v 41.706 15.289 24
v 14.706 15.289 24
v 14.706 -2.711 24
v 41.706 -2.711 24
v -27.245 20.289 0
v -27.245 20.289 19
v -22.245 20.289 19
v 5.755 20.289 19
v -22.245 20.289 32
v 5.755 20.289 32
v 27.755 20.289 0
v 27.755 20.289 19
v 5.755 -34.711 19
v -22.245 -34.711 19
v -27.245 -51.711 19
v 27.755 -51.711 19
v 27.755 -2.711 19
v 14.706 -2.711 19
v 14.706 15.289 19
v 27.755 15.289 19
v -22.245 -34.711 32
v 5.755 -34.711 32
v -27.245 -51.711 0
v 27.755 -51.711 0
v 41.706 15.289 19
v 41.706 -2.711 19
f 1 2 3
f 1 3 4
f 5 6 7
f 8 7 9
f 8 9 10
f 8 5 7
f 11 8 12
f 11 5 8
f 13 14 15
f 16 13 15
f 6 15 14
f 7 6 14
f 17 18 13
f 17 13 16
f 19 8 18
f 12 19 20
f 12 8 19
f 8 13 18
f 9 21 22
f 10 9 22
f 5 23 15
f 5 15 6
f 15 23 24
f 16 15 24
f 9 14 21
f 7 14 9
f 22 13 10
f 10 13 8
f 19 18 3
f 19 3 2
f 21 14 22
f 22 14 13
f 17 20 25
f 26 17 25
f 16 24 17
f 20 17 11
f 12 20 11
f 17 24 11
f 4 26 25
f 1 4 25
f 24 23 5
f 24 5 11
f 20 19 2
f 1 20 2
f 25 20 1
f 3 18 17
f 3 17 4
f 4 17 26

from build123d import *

# Parameters (mm, degrees)
SKIZZE1_W                       = 55
SKIZZE1_H                       = 72
AUFSATZ_LINEAR_AUSTRAGEN1_DEPTH = 19
SKIZZE2_W                       = 28
SKIZZE2_H                       = 55
AUFSATZ_LINEAR_AUSTRAGEN2_DEPTH = 13
SKIZZE3_W                       = 27
SKIZZE3_H                       = 18
AUFSATZ_LINEAR_AUSTRAGEN3_DEPTH = 5


with BuildPart() as part:
    # Skizze1 → Aufsatz-Linear austragen1 (new body)
    with BuildSketch(Plane.XY):
        with Locations((0.254783725, -15.710963455)):
            Rectangle(SKIZZE1_W, SKIZZE1_H)
    extrude(amount=AUFSATZ_LINEAR_AUSTRAGEN1_DEPTH)

    # Skizze2 → Aufsatz-Linear austragen2 (add)
    with BuildSketch(Plane.XY.offset(19)):
        with Locations((-8.245216275, -7.210963455)):
            Rectangle(SKIZZE2_W, SKIZZE2_H)
    extrude(amount=AUFSATZ_LINEAR_AUSTRAGEN2_DEPTH)

    # Skizze3 → Aufsatz-Linear austragen3 (add)
    with BuildSketch(Plane.XY.offset(19)):
        with Locations((28.20593288, 6.289036545)):
            Rectangle(SKIZZE3_W, SKIZZE3_H)
    extrude(amount=AUFSATZ_LINEAR_AUSTRAGEN3_DEPTH)


solid = part.part
